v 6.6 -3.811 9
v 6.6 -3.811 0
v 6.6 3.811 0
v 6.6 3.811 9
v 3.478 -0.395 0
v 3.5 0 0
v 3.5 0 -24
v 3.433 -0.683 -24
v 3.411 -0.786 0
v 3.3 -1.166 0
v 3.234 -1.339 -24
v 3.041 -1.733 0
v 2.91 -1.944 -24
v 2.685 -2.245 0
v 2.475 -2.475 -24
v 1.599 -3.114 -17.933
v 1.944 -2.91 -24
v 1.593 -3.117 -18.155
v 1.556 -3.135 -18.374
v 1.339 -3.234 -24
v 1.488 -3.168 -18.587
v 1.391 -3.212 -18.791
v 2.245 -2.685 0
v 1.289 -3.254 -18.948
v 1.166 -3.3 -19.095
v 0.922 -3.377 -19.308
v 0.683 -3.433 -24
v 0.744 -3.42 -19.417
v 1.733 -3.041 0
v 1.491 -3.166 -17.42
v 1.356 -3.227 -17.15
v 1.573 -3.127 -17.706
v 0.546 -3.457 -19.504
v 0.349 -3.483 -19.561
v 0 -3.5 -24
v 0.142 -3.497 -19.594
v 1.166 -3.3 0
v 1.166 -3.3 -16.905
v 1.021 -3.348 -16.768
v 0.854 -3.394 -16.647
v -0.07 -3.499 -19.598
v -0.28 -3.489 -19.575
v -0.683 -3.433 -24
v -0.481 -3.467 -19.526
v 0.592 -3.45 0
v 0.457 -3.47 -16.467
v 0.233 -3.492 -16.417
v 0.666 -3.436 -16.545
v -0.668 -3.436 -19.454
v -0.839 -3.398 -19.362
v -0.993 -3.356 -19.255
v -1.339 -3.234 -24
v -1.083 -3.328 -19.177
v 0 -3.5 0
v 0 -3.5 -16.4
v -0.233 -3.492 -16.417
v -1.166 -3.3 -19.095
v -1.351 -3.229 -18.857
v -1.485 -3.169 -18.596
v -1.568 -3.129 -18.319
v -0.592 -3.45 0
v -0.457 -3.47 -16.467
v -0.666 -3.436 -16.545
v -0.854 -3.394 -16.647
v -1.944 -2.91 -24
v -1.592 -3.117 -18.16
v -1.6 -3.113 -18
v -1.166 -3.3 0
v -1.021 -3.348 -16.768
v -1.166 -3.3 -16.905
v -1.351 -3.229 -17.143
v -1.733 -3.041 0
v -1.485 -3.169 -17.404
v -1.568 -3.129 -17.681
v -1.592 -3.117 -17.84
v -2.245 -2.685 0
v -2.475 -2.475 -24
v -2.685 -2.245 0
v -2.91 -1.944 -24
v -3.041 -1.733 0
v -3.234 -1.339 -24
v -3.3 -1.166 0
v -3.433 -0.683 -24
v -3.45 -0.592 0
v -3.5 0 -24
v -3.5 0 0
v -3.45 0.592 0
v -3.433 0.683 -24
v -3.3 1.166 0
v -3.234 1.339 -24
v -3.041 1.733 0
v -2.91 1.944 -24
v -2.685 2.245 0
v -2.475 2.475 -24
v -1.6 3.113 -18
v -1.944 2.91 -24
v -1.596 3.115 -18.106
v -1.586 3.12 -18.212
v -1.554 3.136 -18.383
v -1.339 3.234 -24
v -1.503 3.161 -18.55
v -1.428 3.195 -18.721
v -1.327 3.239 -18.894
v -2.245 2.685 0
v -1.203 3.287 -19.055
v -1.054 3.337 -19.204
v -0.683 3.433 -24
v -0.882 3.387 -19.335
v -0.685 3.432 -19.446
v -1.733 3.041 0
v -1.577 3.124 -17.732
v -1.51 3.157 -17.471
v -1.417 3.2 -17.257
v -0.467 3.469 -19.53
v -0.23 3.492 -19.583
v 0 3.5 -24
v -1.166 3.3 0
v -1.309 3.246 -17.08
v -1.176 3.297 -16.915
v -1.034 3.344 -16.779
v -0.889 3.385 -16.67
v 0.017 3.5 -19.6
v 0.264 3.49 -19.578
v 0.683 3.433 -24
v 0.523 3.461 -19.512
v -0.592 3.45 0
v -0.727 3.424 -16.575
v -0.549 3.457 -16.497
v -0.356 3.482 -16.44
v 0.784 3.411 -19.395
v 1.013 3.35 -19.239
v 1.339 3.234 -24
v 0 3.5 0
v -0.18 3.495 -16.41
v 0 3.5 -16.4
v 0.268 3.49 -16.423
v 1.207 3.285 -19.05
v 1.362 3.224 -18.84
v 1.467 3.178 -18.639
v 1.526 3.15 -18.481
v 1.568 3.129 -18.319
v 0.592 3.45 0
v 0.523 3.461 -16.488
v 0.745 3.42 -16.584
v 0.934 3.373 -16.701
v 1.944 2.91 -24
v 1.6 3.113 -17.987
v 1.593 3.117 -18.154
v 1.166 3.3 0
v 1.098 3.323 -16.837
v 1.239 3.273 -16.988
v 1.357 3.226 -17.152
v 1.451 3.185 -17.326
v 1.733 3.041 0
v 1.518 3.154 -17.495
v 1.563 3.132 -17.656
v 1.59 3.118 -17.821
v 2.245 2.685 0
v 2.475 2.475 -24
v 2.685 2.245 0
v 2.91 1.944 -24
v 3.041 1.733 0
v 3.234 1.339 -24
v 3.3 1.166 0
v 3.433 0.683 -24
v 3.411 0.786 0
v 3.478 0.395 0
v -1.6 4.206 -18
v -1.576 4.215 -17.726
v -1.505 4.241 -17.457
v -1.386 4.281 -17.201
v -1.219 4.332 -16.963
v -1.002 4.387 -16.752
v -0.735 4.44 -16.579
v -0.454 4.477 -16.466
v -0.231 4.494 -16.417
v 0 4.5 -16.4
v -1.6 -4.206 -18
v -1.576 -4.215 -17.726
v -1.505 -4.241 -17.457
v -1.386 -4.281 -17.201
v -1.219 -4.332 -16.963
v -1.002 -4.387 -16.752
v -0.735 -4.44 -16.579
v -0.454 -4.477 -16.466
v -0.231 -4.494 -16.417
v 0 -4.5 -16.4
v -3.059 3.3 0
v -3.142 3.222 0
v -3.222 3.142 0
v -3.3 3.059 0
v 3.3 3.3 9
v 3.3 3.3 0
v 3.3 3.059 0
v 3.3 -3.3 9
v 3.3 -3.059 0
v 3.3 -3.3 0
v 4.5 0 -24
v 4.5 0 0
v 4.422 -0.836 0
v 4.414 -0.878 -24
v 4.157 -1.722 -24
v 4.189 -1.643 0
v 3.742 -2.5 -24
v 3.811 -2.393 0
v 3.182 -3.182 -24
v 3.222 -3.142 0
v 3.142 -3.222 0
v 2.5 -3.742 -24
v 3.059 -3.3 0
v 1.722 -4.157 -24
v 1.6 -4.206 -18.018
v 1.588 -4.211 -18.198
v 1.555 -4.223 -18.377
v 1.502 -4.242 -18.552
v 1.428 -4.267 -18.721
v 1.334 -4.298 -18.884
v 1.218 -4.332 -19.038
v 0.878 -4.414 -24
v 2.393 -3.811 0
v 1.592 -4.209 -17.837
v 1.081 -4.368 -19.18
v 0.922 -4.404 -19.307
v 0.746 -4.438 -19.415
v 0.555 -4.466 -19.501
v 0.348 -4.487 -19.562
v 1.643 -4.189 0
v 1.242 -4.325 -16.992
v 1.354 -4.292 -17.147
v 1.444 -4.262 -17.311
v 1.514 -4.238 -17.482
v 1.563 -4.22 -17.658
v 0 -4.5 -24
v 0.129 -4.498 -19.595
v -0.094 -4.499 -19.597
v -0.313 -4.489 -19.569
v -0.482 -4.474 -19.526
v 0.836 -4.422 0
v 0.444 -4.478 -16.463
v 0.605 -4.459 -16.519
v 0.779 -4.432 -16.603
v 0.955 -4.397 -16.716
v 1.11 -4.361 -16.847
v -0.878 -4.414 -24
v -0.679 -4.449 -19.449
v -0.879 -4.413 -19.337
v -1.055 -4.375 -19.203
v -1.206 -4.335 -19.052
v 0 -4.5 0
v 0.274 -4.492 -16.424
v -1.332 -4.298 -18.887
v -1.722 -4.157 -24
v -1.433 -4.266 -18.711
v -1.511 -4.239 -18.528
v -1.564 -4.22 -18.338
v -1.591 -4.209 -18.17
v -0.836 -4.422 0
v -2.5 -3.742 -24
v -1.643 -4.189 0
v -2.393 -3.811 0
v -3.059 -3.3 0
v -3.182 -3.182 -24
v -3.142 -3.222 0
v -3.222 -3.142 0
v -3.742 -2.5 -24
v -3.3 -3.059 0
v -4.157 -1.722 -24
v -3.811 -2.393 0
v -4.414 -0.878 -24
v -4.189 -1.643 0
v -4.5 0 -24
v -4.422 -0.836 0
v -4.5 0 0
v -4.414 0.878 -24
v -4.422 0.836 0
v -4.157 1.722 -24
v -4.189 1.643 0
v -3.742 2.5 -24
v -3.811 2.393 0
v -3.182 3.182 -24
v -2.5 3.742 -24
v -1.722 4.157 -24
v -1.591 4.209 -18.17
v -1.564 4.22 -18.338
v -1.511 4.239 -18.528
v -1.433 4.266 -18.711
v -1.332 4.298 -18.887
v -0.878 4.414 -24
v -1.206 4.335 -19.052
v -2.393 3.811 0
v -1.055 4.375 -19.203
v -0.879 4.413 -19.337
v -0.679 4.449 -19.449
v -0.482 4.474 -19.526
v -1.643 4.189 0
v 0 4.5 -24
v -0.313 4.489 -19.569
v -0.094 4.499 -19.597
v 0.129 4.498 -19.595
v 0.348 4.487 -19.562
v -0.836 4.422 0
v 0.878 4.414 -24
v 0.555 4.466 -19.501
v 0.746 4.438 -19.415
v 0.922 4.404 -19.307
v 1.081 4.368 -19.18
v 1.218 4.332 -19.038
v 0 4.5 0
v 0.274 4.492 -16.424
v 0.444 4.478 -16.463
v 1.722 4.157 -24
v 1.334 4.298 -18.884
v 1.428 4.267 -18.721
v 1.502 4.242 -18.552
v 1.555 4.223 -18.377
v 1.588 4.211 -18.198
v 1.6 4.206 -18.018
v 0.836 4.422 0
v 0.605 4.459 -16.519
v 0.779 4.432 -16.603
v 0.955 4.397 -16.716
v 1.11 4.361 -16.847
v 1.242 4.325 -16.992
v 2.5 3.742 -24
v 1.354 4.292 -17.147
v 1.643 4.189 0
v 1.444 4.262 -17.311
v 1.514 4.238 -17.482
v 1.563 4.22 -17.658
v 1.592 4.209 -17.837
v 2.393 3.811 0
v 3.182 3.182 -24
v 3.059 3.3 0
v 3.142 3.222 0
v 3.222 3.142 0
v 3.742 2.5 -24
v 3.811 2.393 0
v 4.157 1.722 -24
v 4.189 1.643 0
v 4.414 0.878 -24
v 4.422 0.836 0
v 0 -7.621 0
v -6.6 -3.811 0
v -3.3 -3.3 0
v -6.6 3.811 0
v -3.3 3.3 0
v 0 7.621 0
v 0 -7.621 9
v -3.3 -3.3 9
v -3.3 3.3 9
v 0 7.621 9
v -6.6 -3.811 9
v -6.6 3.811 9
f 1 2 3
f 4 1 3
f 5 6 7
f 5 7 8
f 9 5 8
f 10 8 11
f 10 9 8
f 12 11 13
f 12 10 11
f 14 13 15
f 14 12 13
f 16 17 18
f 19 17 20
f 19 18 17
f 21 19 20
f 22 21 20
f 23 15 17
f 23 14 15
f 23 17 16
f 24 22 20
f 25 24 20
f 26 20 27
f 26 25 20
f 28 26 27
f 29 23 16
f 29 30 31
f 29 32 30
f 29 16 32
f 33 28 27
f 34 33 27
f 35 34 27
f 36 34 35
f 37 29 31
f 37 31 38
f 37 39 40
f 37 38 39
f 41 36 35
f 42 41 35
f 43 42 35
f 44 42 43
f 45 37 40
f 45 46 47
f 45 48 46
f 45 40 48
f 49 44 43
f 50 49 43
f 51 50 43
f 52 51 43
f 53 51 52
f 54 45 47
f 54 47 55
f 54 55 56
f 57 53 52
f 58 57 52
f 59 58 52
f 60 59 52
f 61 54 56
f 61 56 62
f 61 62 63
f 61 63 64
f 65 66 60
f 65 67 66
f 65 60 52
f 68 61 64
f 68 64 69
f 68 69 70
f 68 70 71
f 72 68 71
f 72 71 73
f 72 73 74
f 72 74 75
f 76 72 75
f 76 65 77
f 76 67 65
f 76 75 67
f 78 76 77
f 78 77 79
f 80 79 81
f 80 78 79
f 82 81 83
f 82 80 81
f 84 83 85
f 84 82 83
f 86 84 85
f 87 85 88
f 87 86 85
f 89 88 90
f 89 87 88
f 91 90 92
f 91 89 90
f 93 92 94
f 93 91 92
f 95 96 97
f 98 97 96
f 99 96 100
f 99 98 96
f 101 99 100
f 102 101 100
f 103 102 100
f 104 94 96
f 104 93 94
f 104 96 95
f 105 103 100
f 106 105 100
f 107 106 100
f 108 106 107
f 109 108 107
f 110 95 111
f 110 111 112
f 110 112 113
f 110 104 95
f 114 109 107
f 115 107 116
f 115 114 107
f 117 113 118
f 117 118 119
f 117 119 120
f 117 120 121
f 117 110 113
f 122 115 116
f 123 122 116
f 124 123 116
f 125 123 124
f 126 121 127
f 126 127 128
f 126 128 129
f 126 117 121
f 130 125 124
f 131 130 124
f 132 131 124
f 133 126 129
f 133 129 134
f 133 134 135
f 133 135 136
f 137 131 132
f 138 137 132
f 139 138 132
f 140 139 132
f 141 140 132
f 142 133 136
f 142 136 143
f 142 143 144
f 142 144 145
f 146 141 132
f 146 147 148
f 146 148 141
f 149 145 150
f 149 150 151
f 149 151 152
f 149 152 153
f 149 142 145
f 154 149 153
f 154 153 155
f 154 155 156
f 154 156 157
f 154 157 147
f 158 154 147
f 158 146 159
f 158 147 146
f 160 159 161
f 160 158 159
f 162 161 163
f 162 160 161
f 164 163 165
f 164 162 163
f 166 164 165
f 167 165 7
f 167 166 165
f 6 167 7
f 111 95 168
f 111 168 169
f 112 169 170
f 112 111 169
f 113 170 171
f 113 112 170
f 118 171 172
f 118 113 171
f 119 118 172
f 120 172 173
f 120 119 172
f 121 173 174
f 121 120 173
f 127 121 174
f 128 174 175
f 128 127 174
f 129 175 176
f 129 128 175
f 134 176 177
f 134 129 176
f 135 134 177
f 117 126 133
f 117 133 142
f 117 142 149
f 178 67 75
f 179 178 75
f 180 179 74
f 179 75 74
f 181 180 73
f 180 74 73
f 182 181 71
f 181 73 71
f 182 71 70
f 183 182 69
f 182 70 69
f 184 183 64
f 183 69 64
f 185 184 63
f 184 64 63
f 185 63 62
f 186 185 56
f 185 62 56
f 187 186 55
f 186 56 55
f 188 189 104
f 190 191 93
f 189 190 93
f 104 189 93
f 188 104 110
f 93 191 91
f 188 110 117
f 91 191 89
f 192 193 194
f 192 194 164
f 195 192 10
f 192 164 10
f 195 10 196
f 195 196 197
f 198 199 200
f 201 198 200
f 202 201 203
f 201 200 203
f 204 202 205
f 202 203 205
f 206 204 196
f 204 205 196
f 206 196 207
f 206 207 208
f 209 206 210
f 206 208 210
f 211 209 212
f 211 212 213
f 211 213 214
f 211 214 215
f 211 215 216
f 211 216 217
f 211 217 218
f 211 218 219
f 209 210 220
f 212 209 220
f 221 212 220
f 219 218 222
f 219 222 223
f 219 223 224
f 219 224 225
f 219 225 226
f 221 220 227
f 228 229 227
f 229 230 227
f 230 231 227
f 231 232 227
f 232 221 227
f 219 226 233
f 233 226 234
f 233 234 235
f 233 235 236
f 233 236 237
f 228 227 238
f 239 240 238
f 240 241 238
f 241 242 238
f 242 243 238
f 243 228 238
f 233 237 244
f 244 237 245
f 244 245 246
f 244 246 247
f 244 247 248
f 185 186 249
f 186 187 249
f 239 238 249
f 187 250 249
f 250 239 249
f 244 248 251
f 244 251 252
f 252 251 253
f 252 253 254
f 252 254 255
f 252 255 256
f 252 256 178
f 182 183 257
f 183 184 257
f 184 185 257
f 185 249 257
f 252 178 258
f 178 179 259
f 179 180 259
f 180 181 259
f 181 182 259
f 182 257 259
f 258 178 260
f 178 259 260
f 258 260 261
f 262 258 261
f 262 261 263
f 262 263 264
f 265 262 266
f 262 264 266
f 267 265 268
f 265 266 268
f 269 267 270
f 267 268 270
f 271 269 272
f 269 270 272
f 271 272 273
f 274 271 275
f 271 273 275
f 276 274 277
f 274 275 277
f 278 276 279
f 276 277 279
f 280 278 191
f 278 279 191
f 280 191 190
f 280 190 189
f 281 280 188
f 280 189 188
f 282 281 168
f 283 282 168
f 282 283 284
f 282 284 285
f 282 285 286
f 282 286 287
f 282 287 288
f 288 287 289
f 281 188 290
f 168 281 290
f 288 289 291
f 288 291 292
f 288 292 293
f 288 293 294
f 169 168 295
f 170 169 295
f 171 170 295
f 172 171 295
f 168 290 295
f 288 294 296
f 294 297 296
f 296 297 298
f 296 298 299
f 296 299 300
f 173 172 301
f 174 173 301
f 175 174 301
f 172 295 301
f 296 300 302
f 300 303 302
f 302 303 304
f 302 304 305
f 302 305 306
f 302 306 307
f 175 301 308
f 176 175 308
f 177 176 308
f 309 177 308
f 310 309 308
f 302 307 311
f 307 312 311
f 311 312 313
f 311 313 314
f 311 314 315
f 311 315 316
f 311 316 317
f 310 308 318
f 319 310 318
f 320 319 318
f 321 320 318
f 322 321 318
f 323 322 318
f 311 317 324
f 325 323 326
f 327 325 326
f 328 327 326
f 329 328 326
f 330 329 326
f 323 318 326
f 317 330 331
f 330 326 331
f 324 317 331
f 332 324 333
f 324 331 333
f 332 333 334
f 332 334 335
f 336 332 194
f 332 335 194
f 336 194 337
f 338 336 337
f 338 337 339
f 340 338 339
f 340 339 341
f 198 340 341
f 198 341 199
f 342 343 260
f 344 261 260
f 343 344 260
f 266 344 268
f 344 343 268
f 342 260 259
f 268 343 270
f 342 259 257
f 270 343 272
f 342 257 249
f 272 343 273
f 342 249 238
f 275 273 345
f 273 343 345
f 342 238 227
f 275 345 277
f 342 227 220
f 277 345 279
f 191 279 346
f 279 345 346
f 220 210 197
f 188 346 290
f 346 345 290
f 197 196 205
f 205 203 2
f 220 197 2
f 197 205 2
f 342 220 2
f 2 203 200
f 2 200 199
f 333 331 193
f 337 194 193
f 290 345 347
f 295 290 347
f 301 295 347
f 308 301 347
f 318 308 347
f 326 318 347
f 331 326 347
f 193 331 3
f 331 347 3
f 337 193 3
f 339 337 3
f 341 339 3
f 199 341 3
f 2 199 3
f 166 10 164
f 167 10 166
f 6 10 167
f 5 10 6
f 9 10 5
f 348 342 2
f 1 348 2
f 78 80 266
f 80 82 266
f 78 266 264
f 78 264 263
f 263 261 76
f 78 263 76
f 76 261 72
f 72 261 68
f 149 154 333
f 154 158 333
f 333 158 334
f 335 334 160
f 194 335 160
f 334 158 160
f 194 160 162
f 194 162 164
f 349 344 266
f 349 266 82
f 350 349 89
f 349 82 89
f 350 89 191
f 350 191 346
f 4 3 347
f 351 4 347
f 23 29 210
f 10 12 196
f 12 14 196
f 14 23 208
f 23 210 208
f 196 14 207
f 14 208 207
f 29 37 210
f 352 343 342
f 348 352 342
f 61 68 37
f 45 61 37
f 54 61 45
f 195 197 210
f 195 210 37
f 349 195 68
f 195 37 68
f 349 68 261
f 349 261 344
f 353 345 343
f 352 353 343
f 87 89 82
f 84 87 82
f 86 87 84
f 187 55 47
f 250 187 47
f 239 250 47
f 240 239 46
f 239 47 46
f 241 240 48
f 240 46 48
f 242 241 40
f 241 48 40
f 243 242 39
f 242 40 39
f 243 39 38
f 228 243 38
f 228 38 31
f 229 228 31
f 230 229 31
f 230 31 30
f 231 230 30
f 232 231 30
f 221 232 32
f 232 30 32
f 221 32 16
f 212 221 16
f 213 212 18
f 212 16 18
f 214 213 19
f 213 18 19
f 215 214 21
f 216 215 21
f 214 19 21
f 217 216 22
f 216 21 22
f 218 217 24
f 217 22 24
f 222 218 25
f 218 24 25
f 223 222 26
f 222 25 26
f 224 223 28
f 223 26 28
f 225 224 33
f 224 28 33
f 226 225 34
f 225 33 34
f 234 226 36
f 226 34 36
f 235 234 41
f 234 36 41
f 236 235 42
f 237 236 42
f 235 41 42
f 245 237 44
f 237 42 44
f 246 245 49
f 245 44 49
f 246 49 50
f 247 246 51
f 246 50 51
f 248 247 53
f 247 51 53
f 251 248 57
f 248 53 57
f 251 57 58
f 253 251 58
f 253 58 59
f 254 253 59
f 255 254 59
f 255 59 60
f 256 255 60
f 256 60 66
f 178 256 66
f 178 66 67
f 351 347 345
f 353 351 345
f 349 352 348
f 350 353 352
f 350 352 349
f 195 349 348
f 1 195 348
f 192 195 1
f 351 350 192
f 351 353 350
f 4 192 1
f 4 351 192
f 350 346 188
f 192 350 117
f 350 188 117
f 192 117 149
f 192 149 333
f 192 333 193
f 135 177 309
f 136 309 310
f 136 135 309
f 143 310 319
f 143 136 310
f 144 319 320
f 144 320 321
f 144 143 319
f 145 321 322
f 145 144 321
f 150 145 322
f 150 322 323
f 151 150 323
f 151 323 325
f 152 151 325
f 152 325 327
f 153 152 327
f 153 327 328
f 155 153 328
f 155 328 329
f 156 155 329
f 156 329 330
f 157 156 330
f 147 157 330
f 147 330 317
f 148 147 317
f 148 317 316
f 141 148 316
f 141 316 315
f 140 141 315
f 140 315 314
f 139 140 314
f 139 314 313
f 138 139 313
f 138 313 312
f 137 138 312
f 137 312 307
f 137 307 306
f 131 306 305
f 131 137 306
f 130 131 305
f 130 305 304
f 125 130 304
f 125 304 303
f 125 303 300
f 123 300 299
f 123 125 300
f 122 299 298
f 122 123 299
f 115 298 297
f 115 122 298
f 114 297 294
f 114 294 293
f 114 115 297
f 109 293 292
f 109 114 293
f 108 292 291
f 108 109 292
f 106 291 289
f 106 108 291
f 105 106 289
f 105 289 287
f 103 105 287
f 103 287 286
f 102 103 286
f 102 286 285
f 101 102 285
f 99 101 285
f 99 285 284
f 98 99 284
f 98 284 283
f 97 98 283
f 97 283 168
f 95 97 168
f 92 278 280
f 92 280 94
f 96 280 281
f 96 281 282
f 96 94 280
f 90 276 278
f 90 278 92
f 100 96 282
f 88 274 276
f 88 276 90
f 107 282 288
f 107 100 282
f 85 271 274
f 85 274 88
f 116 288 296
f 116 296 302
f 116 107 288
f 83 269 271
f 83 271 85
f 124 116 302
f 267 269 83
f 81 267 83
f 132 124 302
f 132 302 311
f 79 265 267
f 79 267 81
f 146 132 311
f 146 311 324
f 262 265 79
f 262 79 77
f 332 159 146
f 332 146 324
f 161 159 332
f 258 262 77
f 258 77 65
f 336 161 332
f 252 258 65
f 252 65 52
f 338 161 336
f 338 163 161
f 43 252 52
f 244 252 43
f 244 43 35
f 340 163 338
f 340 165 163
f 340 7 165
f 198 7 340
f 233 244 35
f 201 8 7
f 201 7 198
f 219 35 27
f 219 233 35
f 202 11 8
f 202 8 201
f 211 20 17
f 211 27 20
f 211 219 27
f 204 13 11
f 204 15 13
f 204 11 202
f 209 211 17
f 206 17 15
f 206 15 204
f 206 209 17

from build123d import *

# Parameters (mm, degrees)
F1_DEPTH      = 9
F3_DEPTH      = 25
F4_R          = 4.5
F4_R_2        = 3.5
F5_DEPTH      = 24
F7_DEPTH      = 25
F7_DEPTH_BACK = 25


with BuildPart() as f1:
    # F0 (on Top) → F1 (new body)
    with BuildSketch(Plane.XY):
        Polygon((-3.3, 3.3), (-3.3, 0), (-3.3, -3.3), (0, -3.3), (3.3, -3.3), (3.3, 0), (3.3, 3.3), (0, 3.3), align=None)
        Polygon((6.6, -3.810512), (6.6, 3.810512), (0, 7.621024), (-6.6, 3.810512), (-6.6, -3.810512), (0, -7.621024), align=None)
        Polygon((-3.3, -3.3), (-3.3, 0), (-3.3, 3.3), (0, 3.3), (3.3, 3.3), (3.3, 0), (3.3, -3.3), (0, -3.3), align=None, mode=Mode.SUBTRACT)
    extrude(amount=F1_DEPTH)

    # F2 (on face) → F3 (cut)
    with BuildSketch(Plane(origin=(-6.6, 0, 0), x_dir=(0, -1, 0), z_dir=(-1, 0, 0))):
        with BuildLine():
            ThreePointArc((1.6, -12), (1.131371, -10.868629), (0, -10.4))
            ThreePointArc((0, -10.4), (-1.131371, -13.131371), (1.6, -12))
        make_face()
    extrude(amount=-F3_DEPTH, mode=Mode.SUBTRACT)

    # F4 (on face) → F5 (join)
    with BuildSketch(Plane(origin=(0, 0, 0), x_dir=(1, 0, 0), z_dir=(0, 0, -1))):
        Circle(F4_R)
        Circle(F4_R_2, mode=Mode.SUBTRACT)
    extrude(amount=F5_DEPTH)

    # F6 (on face) → F7 (cut, two sides)
    with BuildSketch(Plane(origin=(0, -3.3, 0), x_dir=(-1, 0, 0), z_dir=(0, 1, 0))) as f7_sk:
        with BuildLine():
            ThreePointArc((0, -16.4), (-1.131371, -19.131371), (1.6, -18))
            ThreePointArc((1.6, -18), (1.131371, -16.868629), (0, -16.4))
        make_face()
    extrude(amount=F7_DEPTH, mode=Mode.SUBTRACT)
    extrude(f7_sk.sketch, amount=-F7_DEPTH_BACK, mode=Mode.SUBTRACT)


solid = f1.part
